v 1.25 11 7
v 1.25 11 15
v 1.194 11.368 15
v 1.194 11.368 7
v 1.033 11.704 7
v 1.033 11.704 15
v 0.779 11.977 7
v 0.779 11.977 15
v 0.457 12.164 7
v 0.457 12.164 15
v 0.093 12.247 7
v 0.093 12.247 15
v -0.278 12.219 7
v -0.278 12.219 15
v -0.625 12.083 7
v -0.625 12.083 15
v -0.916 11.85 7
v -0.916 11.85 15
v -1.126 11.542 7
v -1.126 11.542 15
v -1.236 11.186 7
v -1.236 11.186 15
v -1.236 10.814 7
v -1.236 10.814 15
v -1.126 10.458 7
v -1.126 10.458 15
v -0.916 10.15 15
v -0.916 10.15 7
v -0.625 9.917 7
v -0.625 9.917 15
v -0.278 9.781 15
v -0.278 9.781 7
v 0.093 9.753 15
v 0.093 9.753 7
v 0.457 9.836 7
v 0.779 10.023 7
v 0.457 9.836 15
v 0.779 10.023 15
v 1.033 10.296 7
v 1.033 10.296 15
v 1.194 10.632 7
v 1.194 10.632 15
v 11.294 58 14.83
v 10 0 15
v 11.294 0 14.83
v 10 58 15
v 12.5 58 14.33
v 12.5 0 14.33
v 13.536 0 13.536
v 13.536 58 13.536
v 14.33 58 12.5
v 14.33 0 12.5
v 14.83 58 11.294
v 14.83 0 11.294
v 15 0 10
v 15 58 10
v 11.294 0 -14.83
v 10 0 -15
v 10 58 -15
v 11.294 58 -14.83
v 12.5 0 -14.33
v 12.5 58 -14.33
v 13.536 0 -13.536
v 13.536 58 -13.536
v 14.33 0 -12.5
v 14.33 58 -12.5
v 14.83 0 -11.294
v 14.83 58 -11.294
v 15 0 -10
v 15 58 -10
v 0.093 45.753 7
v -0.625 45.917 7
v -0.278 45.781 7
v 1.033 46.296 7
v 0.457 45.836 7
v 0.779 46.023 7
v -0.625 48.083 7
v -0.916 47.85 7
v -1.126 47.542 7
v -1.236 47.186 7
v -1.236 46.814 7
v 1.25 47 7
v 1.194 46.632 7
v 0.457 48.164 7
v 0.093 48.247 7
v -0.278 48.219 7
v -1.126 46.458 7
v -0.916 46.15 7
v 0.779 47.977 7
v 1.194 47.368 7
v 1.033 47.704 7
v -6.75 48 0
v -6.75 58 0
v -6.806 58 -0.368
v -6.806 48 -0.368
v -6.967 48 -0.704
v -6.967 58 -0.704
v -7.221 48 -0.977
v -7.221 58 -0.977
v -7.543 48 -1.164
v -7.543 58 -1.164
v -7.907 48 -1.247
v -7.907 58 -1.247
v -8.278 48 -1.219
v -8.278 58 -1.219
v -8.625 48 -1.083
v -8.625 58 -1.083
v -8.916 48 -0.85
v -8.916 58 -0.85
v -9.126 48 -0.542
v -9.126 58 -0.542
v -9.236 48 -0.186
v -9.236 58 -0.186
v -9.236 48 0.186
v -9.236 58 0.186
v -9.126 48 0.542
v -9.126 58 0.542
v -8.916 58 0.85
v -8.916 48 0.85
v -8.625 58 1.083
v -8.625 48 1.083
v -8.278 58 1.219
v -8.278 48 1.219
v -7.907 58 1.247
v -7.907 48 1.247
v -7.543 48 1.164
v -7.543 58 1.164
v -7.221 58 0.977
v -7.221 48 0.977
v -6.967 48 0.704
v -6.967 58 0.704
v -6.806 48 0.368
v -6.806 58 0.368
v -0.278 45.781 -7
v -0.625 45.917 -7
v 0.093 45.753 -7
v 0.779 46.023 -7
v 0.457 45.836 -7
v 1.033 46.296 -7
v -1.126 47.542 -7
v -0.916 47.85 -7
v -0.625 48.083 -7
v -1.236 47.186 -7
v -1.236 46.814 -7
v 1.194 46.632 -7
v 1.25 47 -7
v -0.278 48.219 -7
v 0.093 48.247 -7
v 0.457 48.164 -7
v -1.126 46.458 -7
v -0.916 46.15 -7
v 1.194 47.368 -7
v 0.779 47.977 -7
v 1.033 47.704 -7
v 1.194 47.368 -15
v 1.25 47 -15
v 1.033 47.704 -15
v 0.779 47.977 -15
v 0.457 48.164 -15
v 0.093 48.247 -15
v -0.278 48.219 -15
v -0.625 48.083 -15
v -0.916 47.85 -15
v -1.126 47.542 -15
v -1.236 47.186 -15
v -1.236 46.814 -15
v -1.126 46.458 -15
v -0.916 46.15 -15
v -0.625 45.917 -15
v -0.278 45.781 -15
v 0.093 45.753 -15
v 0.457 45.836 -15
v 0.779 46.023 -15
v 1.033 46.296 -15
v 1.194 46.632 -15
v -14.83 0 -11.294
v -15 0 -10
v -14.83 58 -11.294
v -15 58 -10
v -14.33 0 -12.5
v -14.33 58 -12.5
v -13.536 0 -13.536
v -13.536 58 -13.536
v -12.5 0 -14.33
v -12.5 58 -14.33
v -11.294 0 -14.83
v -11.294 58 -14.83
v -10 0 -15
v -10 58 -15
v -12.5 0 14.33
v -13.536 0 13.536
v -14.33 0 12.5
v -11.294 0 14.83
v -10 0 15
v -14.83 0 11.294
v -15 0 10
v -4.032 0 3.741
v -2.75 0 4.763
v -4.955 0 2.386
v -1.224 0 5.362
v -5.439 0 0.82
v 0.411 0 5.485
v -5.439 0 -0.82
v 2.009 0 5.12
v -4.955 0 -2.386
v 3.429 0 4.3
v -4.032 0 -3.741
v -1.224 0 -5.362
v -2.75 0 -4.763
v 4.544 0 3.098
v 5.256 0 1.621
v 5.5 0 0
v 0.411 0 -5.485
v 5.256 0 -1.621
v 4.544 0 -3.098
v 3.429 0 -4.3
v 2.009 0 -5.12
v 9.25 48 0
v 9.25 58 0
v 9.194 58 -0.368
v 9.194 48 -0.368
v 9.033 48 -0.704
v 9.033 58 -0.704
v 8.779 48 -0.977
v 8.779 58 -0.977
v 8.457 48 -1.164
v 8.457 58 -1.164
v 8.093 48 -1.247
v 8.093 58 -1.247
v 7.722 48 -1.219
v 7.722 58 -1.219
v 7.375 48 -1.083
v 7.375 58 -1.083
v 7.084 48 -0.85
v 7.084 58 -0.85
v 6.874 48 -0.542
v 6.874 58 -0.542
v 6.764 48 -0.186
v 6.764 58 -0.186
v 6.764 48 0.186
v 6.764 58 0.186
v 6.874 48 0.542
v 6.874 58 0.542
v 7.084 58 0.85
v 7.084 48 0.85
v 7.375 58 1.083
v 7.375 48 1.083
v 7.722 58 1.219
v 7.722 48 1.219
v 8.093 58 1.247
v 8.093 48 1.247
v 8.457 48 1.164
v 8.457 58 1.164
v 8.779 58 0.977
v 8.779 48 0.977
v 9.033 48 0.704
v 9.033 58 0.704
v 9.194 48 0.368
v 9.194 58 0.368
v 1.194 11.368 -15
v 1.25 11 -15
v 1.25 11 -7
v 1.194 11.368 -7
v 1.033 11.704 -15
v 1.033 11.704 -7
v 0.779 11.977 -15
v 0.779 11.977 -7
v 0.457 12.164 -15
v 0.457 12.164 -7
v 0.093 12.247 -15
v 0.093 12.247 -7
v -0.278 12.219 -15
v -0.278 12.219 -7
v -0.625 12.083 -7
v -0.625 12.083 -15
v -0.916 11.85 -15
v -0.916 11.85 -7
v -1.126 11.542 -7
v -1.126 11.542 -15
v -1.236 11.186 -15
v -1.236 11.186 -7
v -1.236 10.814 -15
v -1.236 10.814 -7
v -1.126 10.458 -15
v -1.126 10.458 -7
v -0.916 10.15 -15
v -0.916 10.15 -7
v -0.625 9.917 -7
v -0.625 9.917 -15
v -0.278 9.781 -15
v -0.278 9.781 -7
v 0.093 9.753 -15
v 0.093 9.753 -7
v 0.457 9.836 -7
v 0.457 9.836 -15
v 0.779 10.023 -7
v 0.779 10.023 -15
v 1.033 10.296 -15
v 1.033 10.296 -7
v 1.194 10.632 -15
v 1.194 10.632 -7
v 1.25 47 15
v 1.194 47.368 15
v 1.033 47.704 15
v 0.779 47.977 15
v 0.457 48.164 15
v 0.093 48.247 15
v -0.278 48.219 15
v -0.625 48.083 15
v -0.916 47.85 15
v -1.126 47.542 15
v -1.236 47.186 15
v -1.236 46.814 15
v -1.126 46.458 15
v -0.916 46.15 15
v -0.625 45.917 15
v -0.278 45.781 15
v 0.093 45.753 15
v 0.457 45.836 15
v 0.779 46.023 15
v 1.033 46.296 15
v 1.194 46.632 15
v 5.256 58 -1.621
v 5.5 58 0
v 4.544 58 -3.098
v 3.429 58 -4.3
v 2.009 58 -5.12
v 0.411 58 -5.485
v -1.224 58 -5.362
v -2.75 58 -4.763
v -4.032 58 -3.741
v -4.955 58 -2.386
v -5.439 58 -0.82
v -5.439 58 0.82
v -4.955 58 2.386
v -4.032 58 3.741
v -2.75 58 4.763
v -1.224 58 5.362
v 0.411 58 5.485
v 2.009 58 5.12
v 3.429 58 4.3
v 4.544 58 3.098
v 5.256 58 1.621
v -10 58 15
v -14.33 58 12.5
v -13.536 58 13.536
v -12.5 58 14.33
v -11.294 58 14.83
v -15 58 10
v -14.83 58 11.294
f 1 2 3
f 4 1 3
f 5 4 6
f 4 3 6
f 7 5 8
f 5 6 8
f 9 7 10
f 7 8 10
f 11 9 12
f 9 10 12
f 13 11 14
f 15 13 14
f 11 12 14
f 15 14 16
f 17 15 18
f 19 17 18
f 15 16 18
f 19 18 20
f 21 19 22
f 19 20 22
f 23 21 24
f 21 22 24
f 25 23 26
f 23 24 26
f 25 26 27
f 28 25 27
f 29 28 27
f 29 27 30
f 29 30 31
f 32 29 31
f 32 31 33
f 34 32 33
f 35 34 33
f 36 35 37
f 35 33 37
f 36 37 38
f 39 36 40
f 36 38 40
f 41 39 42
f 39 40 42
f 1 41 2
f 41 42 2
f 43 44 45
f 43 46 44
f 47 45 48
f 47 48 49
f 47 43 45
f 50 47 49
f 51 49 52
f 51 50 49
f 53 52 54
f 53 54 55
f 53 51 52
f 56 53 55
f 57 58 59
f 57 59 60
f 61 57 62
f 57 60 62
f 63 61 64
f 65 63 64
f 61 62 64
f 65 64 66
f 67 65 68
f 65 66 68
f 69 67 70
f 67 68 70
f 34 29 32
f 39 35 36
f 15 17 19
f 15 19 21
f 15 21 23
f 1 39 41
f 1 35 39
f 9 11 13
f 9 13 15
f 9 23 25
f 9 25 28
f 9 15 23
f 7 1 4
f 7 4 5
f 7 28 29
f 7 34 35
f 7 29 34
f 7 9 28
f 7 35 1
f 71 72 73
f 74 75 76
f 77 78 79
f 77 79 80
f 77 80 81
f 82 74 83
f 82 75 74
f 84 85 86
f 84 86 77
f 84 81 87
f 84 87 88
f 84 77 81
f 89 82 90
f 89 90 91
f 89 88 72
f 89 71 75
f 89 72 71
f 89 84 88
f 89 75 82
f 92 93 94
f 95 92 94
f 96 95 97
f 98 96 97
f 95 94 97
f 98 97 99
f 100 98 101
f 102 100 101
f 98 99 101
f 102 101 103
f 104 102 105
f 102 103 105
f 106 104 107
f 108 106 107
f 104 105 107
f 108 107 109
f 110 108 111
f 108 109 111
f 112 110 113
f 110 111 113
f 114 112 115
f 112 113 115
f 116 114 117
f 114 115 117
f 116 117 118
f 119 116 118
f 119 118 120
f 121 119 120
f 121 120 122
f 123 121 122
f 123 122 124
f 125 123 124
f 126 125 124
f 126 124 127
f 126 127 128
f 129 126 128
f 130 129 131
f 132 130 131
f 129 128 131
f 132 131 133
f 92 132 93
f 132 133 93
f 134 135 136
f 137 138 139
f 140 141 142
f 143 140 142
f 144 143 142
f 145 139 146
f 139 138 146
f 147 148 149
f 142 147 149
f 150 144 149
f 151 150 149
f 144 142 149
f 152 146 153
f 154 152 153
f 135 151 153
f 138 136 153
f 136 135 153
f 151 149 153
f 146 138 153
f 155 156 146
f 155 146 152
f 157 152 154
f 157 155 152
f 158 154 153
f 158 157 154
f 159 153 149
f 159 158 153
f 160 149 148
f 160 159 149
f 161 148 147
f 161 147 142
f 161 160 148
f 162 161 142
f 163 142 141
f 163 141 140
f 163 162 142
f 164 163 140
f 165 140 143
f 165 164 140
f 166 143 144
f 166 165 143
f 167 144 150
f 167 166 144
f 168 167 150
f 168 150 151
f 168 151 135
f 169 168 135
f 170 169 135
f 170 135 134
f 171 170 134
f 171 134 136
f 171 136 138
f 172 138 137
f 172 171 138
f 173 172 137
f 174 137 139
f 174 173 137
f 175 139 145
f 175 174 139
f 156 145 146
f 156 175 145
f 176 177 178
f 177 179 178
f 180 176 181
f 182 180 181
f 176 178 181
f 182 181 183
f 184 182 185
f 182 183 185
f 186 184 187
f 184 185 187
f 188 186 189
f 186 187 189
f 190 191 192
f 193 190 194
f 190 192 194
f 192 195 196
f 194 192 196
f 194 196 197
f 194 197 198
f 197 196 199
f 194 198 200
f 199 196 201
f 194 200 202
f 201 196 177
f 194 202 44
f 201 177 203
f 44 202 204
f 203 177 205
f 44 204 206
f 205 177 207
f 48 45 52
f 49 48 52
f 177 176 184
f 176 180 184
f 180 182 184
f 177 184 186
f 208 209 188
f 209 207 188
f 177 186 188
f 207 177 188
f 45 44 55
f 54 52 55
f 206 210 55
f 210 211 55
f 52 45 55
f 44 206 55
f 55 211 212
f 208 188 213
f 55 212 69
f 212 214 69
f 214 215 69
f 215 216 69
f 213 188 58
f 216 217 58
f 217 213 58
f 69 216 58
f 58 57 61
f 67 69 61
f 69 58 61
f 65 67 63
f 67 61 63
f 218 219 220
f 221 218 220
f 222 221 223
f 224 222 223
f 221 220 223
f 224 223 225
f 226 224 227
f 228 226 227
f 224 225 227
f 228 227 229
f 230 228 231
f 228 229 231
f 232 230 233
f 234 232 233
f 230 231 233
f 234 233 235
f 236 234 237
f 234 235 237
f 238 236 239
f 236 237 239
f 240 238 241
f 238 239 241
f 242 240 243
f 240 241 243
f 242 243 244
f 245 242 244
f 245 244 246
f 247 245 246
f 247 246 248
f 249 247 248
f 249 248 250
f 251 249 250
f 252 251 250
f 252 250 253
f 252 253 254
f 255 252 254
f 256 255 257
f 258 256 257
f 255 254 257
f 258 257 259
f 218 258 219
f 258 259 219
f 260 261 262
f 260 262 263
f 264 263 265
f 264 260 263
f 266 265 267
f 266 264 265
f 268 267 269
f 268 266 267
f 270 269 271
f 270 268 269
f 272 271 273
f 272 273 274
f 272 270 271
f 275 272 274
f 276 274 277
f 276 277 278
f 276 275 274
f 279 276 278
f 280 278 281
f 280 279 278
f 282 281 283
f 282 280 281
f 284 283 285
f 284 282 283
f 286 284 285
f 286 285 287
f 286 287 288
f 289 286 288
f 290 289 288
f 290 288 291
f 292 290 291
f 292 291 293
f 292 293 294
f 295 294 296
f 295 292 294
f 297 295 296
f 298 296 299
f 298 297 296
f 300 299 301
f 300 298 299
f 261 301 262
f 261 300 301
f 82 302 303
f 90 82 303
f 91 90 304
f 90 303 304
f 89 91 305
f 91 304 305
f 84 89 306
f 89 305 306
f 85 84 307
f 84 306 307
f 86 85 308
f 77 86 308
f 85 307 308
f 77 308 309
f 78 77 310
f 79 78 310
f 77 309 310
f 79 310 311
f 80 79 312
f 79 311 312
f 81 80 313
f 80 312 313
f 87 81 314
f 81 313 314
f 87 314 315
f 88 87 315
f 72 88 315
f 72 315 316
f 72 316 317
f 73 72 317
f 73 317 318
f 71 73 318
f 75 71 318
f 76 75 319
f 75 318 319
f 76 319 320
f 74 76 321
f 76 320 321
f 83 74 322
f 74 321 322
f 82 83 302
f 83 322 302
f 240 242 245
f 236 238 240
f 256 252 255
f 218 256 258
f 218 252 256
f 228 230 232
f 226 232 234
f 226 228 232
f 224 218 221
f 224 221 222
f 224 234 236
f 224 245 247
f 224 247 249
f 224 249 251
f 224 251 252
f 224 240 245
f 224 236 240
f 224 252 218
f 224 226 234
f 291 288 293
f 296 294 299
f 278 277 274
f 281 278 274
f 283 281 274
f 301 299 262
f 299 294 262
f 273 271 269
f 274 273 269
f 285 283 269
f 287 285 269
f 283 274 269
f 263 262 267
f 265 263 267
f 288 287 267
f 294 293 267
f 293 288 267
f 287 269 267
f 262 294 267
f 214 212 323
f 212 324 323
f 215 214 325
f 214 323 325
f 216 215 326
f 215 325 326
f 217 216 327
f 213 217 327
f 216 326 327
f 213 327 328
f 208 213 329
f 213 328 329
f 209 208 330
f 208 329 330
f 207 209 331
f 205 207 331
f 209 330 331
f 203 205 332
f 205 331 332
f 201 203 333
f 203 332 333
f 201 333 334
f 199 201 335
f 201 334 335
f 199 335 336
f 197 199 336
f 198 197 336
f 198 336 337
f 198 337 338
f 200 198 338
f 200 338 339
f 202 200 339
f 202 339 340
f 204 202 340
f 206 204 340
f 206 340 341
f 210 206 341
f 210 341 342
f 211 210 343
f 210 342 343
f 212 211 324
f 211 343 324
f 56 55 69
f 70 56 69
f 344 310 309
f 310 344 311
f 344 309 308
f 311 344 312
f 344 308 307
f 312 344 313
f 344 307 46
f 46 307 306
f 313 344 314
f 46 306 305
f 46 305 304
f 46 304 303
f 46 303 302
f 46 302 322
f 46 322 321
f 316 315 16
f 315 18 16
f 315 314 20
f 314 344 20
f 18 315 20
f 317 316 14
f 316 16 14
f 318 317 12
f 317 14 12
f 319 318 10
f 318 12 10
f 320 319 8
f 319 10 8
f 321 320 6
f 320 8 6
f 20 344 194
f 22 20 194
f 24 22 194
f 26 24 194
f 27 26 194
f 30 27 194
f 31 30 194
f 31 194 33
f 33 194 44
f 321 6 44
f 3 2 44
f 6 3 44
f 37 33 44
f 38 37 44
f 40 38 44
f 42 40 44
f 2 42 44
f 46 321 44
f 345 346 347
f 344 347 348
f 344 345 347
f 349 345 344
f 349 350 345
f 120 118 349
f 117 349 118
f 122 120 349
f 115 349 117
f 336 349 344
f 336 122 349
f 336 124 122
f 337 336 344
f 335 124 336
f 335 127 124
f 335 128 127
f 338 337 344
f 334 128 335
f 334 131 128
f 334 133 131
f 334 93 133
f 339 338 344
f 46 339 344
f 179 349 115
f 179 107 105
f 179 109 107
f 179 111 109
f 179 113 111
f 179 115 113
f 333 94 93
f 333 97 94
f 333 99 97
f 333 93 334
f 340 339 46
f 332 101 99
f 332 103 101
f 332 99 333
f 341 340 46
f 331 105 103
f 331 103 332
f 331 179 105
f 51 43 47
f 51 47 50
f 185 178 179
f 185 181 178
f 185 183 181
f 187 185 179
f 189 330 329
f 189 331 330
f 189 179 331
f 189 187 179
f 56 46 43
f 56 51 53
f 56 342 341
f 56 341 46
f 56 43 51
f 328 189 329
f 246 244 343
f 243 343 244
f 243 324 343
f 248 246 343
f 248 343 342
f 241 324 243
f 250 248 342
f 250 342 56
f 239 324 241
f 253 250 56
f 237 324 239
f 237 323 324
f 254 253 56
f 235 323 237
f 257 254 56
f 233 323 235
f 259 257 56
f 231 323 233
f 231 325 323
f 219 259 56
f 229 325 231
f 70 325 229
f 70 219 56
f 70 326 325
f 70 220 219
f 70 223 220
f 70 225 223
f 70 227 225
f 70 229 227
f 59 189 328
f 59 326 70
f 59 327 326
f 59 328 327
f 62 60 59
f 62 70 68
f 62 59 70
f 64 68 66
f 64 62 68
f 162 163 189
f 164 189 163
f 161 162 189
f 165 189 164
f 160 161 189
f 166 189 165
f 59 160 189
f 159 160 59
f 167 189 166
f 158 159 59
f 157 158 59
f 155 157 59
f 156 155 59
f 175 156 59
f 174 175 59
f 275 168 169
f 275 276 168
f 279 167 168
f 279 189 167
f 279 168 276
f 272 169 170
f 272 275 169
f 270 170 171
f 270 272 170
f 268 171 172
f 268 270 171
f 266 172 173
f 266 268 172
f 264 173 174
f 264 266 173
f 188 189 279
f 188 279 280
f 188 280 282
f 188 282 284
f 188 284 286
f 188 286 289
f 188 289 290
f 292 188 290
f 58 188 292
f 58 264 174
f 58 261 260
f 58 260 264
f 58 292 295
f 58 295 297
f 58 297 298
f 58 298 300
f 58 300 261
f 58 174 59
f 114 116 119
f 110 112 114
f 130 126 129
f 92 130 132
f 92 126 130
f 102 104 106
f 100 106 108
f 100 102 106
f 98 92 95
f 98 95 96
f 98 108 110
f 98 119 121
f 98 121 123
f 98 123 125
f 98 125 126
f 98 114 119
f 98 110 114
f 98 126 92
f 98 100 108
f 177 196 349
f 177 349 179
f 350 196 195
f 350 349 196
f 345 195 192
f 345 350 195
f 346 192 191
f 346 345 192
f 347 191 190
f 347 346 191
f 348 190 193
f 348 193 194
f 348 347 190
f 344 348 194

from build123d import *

# Parameters (mm, degrees)
SKETCH1_W           = 30
SKETCH1_H           = 30
BOSS_EXTRUDE1_DEPTH = 58
SKETCH2_R           = 5.5
SKETCH2_R_2         = 1.25
CUT_EXTRUDE1_DEPTH  = 10
SKETCH3_R           = 5.5
CUT_EXTRUDE2_DEPTH  = 49
SKETCH4_R           = 1.25
CUT_EXTRUDE3_DEPTH  = 8
FILLET1_R           = 5


with BuildPart() as part:
    # Sketch1 → Boss-Extrude1 (new body)
    with BuildSketch(Plane(origin=(0, 0, 0), x_dir=(1, 0, 0), z_dir=(0, 1, 0))):
        Rectangle(SKETCH1_W, SKETCH1_H)
    extrude(amount=BOSS_EXTRUDE1_DEPTH)

    # Sketch2 → Cut-Extrude1 (cut)
    with BuildSketch(Plane(origin=(0, 58, 0), x_dir=(1, 0, 0), z_dir=(0, 1, 0))):
        Circle(SKETCH2_R)
        with Locations((8, 0)):
            Circle(SKETCH2_R_2)
        with Locations((-8, 0)):
            Circle(SKETCH2_R_2)
    extrude(amount=-CUT_EXTRUDE1_DEPTH, mode=Mode.SUBTRACT)

    # Sketch3 → Cut-Extrude2 (cut, through all)
    with BuildSketch(Plane(origin=(0, 48, 0), x_dir=(1, 0, 0), z_dir=(0, 1, 0))):
        Circle(SKETCH3_R)
    extrude(amount=-CUT_EXTRUDE2_DEPTH, mode=Mode.SUBTRACT)

    # Sketch4 → Cut-Extrude3 (cut)
    with BuildSketch(Plane.XY.offset(15)):
        with Locations((0, 47)):
            Circle(SKETCH4_R)
        with Locations((0, 11)):
            Circle(SKETCH4_R)
    cut_extrude3 = extrude(amount=-CUT_EXTRUDE3_DEPTH, mode=Mode.SUBTRACT)

    # Mirror1: Cut-Extrude3 across plane
    add(cut_extrude3.mirror(Plane.XY), mode=Mode.SUBTRACT)

    # Fillet1
    fillet1_edges = [part.edges().sort_by_distance(p)[0] for p in [
        (15, 29, 15),
        (-15, 29, 15),
        (-15, 29, -15),
        (15, 29, -15),
    ]]
    fillet(fillet1_edges, radius=FILLET1_R)


solid = part.part
